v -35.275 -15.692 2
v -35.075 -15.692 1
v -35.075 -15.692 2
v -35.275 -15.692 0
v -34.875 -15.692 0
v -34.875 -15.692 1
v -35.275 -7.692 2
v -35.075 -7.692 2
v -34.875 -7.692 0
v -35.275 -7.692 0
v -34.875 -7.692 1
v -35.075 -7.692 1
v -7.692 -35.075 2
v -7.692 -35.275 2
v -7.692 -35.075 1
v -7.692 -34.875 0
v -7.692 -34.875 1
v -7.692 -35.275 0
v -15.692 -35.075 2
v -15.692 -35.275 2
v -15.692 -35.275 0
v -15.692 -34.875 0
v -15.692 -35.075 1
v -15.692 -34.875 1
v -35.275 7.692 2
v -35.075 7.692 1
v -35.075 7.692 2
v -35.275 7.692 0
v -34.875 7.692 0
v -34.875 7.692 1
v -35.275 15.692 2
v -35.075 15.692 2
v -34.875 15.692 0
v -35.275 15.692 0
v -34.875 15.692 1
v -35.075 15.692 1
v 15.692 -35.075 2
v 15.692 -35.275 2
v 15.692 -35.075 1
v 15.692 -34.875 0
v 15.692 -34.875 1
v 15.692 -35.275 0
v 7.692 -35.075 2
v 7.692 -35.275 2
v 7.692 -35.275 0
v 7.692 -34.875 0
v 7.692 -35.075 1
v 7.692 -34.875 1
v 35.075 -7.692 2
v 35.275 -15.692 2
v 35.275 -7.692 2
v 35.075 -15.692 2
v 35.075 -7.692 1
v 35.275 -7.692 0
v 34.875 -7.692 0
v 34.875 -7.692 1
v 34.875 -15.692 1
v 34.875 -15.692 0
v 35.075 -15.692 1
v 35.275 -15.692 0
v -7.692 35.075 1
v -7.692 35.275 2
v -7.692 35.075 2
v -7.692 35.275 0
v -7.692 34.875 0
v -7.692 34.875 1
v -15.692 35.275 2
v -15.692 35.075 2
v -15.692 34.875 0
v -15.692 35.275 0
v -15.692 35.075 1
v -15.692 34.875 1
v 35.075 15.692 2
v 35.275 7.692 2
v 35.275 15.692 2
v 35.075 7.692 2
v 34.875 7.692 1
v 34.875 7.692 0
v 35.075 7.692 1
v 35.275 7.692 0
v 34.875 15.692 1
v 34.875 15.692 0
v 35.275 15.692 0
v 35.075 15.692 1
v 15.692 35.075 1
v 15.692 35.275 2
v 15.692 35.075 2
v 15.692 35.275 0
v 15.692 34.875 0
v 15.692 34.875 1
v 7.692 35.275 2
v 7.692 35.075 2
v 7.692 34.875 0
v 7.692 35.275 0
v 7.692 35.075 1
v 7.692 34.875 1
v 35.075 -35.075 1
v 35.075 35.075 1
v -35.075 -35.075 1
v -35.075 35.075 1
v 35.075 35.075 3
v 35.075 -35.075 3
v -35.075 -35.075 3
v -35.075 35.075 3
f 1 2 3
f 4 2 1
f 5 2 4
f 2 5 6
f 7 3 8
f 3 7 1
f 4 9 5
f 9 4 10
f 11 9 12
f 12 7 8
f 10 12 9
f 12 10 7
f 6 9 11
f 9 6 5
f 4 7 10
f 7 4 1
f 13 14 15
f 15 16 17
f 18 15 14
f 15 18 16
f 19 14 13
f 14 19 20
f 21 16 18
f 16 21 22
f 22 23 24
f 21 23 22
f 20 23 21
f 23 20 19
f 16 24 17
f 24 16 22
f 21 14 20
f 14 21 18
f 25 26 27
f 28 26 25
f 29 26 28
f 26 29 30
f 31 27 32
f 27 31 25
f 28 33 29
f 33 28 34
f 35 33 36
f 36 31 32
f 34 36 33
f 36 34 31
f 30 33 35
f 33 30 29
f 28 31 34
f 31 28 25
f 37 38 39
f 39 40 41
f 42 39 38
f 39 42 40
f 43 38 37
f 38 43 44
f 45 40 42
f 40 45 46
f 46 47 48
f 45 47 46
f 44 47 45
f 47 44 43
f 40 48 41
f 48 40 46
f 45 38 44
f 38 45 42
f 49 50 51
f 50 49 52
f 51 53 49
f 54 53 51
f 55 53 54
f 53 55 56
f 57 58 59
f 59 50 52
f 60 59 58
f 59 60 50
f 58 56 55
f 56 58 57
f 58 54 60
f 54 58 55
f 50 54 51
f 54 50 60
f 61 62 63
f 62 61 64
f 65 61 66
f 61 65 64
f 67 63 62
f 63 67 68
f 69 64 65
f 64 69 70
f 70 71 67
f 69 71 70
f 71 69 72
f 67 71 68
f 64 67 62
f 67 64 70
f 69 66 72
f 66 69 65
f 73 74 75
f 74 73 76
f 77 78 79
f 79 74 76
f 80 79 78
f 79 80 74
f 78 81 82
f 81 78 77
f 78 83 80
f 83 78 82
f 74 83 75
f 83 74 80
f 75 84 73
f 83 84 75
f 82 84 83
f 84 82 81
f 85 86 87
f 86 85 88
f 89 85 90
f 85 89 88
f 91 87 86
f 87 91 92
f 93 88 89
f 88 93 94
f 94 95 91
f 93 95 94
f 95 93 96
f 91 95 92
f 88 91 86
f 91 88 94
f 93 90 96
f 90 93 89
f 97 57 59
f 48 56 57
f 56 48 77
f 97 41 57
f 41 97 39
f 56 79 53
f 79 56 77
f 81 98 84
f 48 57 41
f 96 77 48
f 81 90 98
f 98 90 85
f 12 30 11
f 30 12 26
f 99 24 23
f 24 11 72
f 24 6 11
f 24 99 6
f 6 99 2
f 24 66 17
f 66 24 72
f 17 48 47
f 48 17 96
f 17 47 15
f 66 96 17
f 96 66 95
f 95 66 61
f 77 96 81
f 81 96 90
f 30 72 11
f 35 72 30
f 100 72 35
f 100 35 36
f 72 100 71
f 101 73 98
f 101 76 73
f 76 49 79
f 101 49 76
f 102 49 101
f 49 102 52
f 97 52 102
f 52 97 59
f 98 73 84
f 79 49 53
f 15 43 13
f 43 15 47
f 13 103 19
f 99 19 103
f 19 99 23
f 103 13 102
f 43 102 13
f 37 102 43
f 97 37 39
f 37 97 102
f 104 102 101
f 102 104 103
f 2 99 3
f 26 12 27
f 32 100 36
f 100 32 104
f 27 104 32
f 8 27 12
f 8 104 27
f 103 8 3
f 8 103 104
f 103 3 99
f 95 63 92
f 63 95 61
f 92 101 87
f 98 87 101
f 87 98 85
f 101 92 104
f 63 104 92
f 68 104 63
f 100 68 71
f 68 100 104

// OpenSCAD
// ==== Shared Parameters ====
// Measure your pedestal's internal rebate (seat) carefully.
cavity_w   = 70;    // inner width (mm)
cavity_d   = 70;    // inner depth (mm)
lip_depth  = 2;     // rebate depth available for the diffuser to sit in (mm)
thickness  = 2.0;   // diffuser thickness (mm)
clearance  = 0.3;   // positive clearance for sit-on fit (mm)
chamfer    = 0.6;   // small edge break

/*
  Square diffuser — snap-in (light press fit with micro barbs)
*/
barb_h   = 0.4;   // radial barb height (mm) — test small!
barb_w   = 8;     // barb width along edge (mm)
barb_count_per_side = 2;

module chamfered_plate(w,d,t, c){
  linear_extrude(height=t)
    offset(delta=-c)
      offset(delta=+c)
        square([w,d], center=true);
}

module barb(){
  cube([barb_w, barb_h, lip_depth], center=true);
}

w = cavity_w + (clearance/2); // minimal clearance; barbs take up the grip
d = cavity_d + (clearance/2);

translate([0,0,thickness/2])
  chamfered_plate(w, d, thickness, chamfer);

// place barbs around perimeter centered at mid-thickness
for (i=[-1:2:1]){
  for (k=[1:barb_count_per_side]){
    // along X edges
    translate([i*(w/2), (k/(barb_count_per_side+1))*d - d/2, lip_depth/2])
      rotate([0,0, i==1 ? 90 : -90]) barb();
    // along Y edges
    translate([(k/(barb_count_per_side+1))*w - w/2, i*(d/2), lip_depth/2])
      barb();
  }
}
